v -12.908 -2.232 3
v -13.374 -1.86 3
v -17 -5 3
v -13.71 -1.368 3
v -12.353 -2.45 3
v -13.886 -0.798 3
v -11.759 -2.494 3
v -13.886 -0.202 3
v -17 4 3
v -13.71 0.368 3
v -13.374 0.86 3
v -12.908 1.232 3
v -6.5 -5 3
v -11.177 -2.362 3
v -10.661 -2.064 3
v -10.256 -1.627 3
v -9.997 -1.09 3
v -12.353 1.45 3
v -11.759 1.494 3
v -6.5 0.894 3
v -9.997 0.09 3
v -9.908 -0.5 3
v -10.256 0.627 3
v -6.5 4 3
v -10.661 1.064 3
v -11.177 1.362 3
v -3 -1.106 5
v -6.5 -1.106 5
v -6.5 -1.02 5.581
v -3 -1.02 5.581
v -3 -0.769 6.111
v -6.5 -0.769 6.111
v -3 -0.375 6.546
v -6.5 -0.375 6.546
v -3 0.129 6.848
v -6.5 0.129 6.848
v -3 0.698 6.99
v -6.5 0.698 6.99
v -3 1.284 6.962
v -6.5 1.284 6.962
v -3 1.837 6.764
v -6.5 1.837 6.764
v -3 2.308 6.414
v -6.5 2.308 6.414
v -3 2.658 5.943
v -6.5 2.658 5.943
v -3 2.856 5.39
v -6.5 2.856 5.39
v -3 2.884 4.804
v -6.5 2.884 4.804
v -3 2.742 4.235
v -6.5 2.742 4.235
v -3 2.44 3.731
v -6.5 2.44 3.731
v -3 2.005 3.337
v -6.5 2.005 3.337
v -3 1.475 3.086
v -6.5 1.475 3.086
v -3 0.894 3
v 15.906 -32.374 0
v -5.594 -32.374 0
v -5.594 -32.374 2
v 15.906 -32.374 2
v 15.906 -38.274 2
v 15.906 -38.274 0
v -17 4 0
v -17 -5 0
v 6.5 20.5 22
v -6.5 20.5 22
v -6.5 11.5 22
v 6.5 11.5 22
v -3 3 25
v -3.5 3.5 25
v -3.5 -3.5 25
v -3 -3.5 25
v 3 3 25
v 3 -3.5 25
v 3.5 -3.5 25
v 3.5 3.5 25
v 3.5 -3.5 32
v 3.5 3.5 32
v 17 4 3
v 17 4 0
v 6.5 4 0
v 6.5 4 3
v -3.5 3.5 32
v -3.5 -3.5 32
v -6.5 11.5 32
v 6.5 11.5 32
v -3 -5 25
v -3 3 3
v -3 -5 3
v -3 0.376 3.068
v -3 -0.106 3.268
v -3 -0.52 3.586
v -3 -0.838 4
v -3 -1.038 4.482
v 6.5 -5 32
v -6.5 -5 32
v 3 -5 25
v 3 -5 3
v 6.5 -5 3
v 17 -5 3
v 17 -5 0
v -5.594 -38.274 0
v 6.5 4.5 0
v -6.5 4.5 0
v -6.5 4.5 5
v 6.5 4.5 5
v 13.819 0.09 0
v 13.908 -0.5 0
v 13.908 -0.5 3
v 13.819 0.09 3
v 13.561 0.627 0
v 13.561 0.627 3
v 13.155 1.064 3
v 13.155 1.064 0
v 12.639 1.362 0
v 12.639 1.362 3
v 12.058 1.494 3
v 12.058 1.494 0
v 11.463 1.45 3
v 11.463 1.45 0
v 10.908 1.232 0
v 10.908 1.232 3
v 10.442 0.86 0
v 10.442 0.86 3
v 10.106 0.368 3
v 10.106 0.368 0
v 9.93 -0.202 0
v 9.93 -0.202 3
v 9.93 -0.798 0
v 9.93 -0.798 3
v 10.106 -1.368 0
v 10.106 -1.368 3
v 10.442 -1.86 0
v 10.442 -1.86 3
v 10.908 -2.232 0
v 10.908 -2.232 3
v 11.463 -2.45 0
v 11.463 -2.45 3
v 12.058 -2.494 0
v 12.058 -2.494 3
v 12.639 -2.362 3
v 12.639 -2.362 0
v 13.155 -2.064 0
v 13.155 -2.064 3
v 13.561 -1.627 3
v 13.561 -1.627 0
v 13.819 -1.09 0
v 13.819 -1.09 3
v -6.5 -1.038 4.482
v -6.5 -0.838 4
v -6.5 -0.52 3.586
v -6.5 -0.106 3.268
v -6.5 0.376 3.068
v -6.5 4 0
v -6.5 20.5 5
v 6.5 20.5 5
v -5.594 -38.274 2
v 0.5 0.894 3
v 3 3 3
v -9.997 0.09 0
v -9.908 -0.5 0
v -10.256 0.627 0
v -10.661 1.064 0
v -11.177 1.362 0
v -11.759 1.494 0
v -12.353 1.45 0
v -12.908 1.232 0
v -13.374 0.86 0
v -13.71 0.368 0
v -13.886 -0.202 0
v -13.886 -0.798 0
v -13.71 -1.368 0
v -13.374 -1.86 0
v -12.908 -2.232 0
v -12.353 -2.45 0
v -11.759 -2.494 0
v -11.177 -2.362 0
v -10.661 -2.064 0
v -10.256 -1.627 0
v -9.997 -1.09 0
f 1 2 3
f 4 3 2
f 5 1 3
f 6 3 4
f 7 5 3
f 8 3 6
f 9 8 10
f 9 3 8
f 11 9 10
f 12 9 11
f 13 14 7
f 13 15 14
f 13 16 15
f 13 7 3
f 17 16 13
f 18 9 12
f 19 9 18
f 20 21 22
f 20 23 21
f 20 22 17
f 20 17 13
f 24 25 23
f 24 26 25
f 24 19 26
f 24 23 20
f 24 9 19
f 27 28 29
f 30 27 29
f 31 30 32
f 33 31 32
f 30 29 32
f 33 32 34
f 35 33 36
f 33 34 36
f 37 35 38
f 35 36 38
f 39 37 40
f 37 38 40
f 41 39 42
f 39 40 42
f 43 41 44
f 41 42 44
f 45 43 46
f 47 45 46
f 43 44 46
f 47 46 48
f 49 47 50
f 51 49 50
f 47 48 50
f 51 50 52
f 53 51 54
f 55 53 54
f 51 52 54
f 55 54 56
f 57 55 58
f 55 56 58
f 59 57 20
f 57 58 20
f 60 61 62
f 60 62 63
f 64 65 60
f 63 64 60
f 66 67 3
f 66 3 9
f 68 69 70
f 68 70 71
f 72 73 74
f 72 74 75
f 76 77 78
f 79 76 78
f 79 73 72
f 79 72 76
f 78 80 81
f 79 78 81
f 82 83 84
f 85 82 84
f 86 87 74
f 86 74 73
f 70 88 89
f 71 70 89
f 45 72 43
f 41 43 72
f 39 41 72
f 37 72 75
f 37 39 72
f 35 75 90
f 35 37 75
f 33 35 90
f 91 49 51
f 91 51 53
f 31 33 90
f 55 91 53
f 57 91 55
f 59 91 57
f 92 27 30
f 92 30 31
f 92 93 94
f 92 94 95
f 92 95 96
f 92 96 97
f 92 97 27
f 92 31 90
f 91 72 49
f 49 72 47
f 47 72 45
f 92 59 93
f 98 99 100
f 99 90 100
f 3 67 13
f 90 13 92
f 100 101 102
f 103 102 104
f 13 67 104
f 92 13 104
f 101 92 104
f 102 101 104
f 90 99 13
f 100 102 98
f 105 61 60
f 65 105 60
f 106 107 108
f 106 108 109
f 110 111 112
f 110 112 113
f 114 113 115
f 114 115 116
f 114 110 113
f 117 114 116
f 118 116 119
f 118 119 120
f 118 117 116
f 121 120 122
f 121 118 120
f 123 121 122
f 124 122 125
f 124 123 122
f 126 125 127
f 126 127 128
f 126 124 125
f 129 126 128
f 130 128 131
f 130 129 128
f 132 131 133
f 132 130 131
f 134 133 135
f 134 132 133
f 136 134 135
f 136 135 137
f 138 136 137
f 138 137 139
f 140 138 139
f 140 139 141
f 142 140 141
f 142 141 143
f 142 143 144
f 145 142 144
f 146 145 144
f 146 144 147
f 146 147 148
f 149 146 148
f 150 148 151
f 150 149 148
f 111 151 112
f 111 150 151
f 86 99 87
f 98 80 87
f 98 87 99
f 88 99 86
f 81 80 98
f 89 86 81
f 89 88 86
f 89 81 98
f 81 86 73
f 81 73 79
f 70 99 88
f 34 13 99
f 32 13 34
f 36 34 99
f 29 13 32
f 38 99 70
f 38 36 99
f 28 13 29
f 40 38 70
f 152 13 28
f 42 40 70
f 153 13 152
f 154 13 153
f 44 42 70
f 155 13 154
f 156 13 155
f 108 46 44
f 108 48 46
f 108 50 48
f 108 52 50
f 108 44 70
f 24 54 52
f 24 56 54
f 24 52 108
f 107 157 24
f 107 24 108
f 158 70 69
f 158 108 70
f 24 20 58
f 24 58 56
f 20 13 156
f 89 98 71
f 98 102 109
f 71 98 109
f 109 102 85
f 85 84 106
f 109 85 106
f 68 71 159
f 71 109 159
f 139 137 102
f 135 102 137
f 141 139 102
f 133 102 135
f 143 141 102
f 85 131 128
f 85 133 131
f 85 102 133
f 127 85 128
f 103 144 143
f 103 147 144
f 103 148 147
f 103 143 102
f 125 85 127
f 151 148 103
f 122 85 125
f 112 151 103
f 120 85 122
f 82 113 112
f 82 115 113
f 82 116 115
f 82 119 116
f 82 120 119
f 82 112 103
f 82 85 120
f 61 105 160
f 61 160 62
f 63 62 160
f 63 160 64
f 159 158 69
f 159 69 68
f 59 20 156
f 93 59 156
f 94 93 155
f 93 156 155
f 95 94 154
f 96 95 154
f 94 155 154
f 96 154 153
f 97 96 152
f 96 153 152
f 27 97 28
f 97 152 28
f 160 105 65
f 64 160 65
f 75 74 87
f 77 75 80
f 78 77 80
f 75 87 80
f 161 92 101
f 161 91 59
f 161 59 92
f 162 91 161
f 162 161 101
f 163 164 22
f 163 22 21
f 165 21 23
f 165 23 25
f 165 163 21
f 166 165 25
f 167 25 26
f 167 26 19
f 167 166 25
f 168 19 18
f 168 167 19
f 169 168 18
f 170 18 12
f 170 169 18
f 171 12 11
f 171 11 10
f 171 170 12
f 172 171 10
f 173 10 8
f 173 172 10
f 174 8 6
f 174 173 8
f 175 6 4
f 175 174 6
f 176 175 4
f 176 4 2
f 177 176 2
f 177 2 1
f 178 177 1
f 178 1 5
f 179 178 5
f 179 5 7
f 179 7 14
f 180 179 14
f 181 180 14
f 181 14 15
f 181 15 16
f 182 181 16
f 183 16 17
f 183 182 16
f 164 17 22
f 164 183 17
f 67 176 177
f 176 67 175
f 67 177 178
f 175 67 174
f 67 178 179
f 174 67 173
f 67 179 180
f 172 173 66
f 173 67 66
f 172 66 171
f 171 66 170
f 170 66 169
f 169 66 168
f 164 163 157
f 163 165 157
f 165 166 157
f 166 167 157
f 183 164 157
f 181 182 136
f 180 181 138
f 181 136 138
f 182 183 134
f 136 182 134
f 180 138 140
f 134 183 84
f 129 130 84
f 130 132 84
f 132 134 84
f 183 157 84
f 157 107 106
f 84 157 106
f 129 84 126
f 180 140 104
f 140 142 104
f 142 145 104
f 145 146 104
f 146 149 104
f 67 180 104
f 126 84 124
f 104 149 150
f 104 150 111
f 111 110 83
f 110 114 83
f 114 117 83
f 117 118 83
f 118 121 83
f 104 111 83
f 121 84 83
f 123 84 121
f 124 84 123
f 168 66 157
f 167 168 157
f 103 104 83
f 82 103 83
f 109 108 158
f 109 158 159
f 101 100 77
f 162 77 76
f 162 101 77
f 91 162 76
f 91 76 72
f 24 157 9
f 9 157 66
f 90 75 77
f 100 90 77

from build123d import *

# Parameters (mm, degrees)
F0_W      = 13
F0_H      = 25.5
F1_DEPTH  = 32
F2_W      = 7
F2_H      = 7
F3_DEPTH  = 7
F4_W      = 6
F4_H      = 2.3767555878
F5_DEPTH  = 25
F2_W_2    = 13
F2_H_2    = 9
F6_DEPTH  = 10
F7_W      = 10.5
F7_H      = 9
F7_R      = 2
F7_W_2    = 13
F8_DEPTH  = 3
F7_H_2    = 16
F9_DEPTH  = 5
F11_DEPTH = 7
F12_W     = 21.5
F12_H     = 5.9
F13_DEPTH = 2


# Not quite as in the source:
# - a feature names something its author has since deleted; it is built from what else it names


with BuildPart() as f1:
    # F0 (on Top) → F1 (new body)
    with BuildSketch(Plane.XY):
        with Locations((0, 7.75)):
            Rectangle(F0_W, F0_H)
    extrude(amount=F1_DEPTH)

    # F2 (on face) → F3 (cut)
    with BuildSketch(Plane.XY.offset(32)):
        Rectangle(F2_W, F2_H)
    extrude(amount=-F3_DEPTH, mode=Mode.SUBTRACT)

    # F4 (on face) → F5 (cut)
    with BuildSketch(Plane.XY):
        Polygon((3, 3), (-3, 3), (-3, -3), (-3, -5), (3, -5), (3, -3), align=None)
        with Locations((0, -6.1883777939)):
            Rectangle(F4_W, F4_H)
    extrude(amount=F5_DEPTH, mode=Mode.SUBTRACT)

    # F2 (on face) → F6 (cut)
    with BuildSketch(Plane.XY.offset(32)):
        with Locations((0, 16)):
            Rectangle(F2_W_2, F2_H_2)
    extrude(amount=-F6_DEPTH, mode=Mode.SUBTRACT)

    # F7 (on face) → F8 (join)
    with BuildSketch(Plane.XY):
        with Locations((11.75, -0.5)):
            Rectangle(F7_W, F7_H)
        with Locations((11.9080794975, -0.5)):
            Circle(F7_R, mode=Mode.SUBTRACT)
        with Locations((-11.75, -0.5)):
            Rectangle(F7_W, F7_H)
        with Locations((-11.9080794975, -0.5)):
            Circle(F7_R, mode=Mode.SUBTRACT)
        with Locations((0, -0.5)):
            Rectangle(F7_W_2, F7_H)
    extrude(amount=F8_DEPTH)

    # F7 (on face) → F9 (cut)
    with BuildSketch(Plane.XY):
        Polygon((-8.2614710554, 4.5), (-6.5, 4.5), (-6.5, 20.5), (6.5, 20.5), (6.5, 4.5), (7.7385289446, 4.5), (7.7385289446, 22.5), (-8.2614710554, 22.5), align=None)
        with Locations((0, 12.5)):
            Rectangle(F7_W_2, F7_H_2)
    extrude(amount=F9_DEPTH, mode=Mode.SUBTRACT)

    # F10 (on face) → F11 (cut)
    with BuildSketch(Plane(origin=(-6.5, 0, 0), x_dir=(0, -1, 0), z_dir=(-1, 0, 0))):
        with BuildLine():
            ThreePointArc((-0.8941277629, 3), (0.5200857995, 3.5857864376), (1.1058722371, 5))
            ThreePointArc((1.1058722371, 5), (-2.3083413252, 6.4142135624), (-0.8941277629, 3))
        make_face()
    extrude(amount=-F11_DEPTH, mode=Mode.SUBTRACT)


with BuildPart() as f13:
    # F12 (on Top) → F13 (new body)
    with BuildSketch(Plane.XY):
        with Locations((5.1557905699, -35.3235676074)):
            Rectangle(F12_W, F12_H)
    extrude(amount=F13_DEPTH)


solid = Compound([f1.part, f13.part])
